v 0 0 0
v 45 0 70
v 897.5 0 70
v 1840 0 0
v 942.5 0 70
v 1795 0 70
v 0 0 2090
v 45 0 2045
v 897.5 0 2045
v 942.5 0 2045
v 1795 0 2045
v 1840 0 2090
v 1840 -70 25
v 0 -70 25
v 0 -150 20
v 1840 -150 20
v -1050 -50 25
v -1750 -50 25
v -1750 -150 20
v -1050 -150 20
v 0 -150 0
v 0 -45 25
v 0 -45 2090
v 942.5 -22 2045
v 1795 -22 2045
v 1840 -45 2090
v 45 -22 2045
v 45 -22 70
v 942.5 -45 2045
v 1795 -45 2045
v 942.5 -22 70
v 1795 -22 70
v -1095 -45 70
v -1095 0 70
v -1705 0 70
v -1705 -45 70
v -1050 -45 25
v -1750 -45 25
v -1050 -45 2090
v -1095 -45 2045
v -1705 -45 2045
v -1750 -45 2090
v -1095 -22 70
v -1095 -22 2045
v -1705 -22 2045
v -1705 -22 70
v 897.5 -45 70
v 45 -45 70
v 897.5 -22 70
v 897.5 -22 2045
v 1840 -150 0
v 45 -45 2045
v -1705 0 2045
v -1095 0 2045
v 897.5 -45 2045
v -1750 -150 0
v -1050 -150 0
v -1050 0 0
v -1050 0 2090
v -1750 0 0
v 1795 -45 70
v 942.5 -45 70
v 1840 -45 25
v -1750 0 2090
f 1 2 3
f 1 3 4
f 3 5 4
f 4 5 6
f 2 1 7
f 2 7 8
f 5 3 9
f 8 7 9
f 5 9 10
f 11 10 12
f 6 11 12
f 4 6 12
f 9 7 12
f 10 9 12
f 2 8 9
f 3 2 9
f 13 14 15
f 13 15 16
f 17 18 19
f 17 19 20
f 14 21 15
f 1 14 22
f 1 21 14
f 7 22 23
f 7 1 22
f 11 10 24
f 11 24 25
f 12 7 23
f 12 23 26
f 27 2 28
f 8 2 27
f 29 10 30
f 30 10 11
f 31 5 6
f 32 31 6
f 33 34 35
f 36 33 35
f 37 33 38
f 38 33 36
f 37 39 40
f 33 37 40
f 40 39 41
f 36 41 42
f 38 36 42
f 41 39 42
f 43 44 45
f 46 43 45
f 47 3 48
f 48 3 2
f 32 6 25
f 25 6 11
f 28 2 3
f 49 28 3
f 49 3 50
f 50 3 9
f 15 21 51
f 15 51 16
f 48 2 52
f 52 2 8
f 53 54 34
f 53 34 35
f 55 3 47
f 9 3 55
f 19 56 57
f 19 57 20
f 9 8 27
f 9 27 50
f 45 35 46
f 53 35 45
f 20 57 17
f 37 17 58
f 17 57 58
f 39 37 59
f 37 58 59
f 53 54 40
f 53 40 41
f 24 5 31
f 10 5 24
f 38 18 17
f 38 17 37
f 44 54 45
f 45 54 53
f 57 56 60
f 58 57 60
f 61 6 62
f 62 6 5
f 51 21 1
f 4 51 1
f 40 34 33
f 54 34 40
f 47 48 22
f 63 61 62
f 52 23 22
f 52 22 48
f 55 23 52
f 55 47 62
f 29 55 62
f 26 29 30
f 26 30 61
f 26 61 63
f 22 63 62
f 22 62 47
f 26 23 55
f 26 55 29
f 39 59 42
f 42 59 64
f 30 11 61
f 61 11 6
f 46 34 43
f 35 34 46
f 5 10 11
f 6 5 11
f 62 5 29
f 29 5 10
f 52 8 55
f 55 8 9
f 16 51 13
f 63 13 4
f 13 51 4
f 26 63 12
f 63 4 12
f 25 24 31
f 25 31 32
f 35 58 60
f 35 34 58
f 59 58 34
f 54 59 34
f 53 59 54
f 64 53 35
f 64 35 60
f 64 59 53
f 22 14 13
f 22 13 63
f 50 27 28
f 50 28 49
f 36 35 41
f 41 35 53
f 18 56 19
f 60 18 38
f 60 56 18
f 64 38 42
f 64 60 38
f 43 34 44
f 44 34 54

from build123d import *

# Parameters (mm, degrees)
F1_W      = 150
F1_H      = 25
F2_DEPTH  = 1840
F3_W      = 1840
F3_H      = 2065
F3_W_2    = 45
F3_H_2    = 1975
F4_DEPTH  = 45
F3_W_3    = 852.5
F5_DEPTH  = 22
F6_SIZE2  = 80
F6_SIZE   = 5
F8_W      = 150
F8_H      = 25
F9_DEPTH  = 700
F10_W     = 700
F10_H     = 2065
F10_W_2   = 610
F10_H_2   = 1975
F11_DEPTH = 45
F12_DEPTH = 22
F13_SIZE2 = 100
F13_SIZE  = 5


with BuildPart() as f2:
    # F1 (on Right) → F2 (new body)
    with BuildSketch(Plane.YZ):
        with Locations((-75, 12.5)):
            Rectangle(F1_W, F1_H)
    extrude(amount=F2_DEPTH)

    # F3 (on Front) → F4 (join)
    with BuildSketch(Plane.XZ):
        with Locations((920, 1057.5)):
            Rectangle(F3_W, F3_H)
        Polygon((45, 70), (45, 2045), (897.5, 2045), (942.5, 2045), (1795, 2045), (1795, 70), (942.5, 70), (897.5, 70), align=None, mode=Mode.SUBTRACT)
        with Locations((920, 1057.5)):
            Rectangle(F3_W_2, F3_H_2)
    extrude(amount=F4_DEPTH)

    # F6
    f6_edges = [f2.edges().sort_by_distance(p)[0] for p in [
        (920, -150, 25),
    ]]
    f6_side = f2.faces().sort_by_distance((920, -150, 12.5))[0]
    chamfer(f6_edges, length=F6_SIZE, length2=F6_SIZE2, reference=f6_side)


with BuildPart() as f5:
    # F3 (on Front) → F5 (new body)
    with BuildSketch(Plane.XZ):
        with Locations((471.25, 1057.5)):
            Rectangle(F3_W_3, F3_H_2)
    extrude(amount=F5_DEPTH)


with BuildPart() as f5b:
    # F3 (on Front) → F5, piece 2 (new body)
    with BuildSketch(Plane.XZ):
        with Locations((1368.75, 1057.5)):
            Rectangle(F3_W_3, F3_H_2)
    extrude(amount=F5_DEPTH)


with BuildPart() as f9:
    # F8 (on offset) → F9 (new body)
    with BuildSketch(Plane.YZ.offset(-1750)):
        with Locations((-75, 12.5)):
            Rectangle(F8_W, F8_H)
    extrude(amount=F9_DEPTH)

    # F10 (on face) → F11 (join)
    with BuildSketch(Plane(origin=(0, 0, 0), x_dir=(-1, 0, 0), z_dir=(0, 1, 0))):
        with Locations((1400, 1057.5)):
            Rectangle(F10_W, F10_H)
        with Locations((1400, 1057.5)):
            Rectangle(F10_W_2, F10_H_2, mode=Mode.SUBTRACT)
    extrude(amount=-F11_DEPTH)

    # F13
    f13_edges = [f9.edges().sort_by_distance(p)[0] for p in [
        (-1400, -150, 25),
    ]]
    f13_side = f9.faces().sort_by_distance((-1400, -150, 12.5))[0]
    chamfer(f13_edges, length=F13_SIZE, length2=F13_SIZE2, reference=f13_side)


with BuildPart() as f12:
    # F10 (on face) → F12 (new body)
    with BuildSketch(Plane(origin=(0, 0, 0), x_dir=(-1, 0, 0), z_dir=(0, 1, 0))):
        with Locations((1400, 1057.5)):
            Rectangle(F10_W_2, F10_H_2)
    extrude(amount=-F12_DEPTH)


solid = Compound([f2.part, f5.part, f5b.part, f9.part, f12.part])
